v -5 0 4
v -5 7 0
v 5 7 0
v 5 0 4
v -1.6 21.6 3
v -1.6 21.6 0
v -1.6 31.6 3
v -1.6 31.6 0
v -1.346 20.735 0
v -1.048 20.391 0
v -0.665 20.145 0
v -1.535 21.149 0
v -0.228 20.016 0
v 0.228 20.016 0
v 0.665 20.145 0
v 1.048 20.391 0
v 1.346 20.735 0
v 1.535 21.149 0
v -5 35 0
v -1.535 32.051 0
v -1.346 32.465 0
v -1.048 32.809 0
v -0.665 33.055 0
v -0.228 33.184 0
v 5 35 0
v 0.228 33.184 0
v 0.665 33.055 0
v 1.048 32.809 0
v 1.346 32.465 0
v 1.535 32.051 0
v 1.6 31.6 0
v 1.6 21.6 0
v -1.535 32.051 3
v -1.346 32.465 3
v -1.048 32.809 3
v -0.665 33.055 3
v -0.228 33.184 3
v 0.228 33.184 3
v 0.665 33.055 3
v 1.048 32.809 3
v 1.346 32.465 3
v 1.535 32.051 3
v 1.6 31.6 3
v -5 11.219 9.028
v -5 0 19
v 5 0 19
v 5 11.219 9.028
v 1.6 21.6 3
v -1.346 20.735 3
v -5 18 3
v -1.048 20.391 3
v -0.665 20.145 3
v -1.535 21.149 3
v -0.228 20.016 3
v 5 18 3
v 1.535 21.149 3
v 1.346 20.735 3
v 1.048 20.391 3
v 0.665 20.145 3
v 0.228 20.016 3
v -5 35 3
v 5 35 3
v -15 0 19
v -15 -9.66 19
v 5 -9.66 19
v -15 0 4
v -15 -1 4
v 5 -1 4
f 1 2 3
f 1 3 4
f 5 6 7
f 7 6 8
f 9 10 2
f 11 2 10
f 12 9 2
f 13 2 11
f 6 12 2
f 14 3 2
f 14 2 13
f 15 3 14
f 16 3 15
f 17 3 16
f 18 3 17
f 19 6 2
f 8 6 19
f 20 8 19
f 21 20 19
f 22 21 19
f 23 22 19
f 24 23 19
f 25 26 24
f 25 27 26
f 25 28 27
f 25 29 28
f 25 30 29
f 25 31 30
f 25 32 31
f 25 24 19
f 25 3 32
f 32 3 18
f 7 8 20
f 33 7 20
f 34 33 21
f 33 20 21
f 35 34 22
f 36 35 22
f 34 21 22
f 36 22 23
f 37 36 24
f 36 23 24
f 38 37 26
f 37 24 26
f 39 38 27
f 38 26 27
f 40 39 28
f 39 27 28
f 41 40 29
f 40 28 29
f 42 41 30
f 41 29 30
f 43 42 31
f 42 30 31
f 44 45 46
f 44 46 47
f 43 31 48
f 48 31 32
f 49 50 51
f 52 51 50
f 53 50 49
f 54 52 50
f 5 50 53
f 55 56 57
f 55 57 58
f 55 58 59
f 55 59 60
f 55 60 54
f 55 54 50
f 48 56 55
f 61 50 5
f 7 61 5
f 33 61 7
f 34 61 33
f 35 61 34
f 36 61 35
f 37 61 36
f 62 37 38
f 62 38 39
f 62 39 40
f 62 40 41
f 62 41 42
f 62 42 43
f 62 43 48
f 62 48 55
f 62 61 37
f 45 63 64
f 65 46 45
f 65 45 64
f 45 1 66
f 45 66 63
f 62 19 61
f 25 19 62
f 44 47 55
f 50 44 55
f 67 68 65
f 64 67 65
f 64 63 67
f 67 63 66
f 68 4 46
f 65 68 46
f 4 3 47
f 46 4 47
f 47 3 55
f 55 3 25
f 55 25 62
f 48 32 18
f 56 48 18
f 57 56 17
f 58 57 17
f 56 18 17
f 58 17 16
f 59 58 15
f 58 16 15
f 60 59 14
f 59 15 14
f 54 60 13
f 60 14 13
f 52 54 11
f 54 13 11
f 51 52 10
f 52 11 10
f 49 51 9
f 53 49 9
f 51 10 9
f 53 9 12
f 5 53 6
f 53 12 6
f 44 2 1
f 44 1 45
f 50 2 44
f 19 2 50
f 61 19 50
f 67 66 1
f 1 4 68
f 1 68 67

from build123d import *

# Parameters (mm, degrees)
SKETCH1_W           = 10
SKETCH1_H           = 25
BOSS_EXTRUDE1_DEPTH = 3
SKETCH3_W           = 3
SKETCH3_H           = 7
BOSS_EXTRUDE2_DEPTH = 10
BOSS_EXTRUDE3_DEPTH = 20
BOSS_EXTRUDE4_DEPTH = 10


with BuildPart() as part:
    # Sketch1 → Boss-Extrude1 (new body)
    with BuildSketch(Plane.XY):
        with Locations((0, 22.5)):
            Rectangle(SKETCH1_W, SKETCH1_H)
        with BuildLine():
            ThreePointArc((-1.6, 31.6), (0, 33.2), (1.6, 31.6))
            Line((1.6, 31.6), (1.6, 21.6))
            ThreePointArc((1.6, 21.6), (0, 20), (-1.6, 21.6))
            Line((-1.6, 21.6), (-1.6, 31.6))
        make_face(mode=Mode.SUBTRACT)
    extrude(amount=BOSS_EXTRUDE1_DEPTH)

    # Sketch3 → Boss-Extrude2 (add)
    with BuildSketch(Plane(origin=(5, 0, 0), x_dir=(0, 0, -1), z_dir=(1, 0, 0))):
        Polygon((0, 7), (0, 10), (-3, 10), (-7, 10), (-7, 7), (-4, 7), align=None)
        with Locations((-5.5, 3.5)):
            Rectangle(SKETCH3_W, SKETCH3_H)
    extrude(amount=-BOSS_EXTRUDE2_DEPTH)

    # Sketch4 → Boss-Extrude3 (add)
    with BuildSketch(Plane(origin=(5, 0, 0), x_dir=(0, 0, -1), z_dir=(1, 0, 0))):
        Polygon((-19, -9.660254038), (-4, 0), (-7, 0), (-19, 0), align=None)
        Polygon((-4, -1), (-19, -9.660254038), (-4, 0), align=None)
    extrude(amount=-BOSS_EXTRUDE3_DEPTH)

    # Sketch5 → Boss-Extrude4 (add)
    with BuildSketch(Plane.ZY.offset(5)):
        Polygon((4, 7), (0, 7), (4, 0), align=None)
        Polygon((3, 18), (0, 7), (4, 7), (4, 0), (19, 0), (9.027600975, 11.218948904), align=None)
    extrude(amount=-BOSS_EXTRUDE4_DEPTH)


solid = part.part
